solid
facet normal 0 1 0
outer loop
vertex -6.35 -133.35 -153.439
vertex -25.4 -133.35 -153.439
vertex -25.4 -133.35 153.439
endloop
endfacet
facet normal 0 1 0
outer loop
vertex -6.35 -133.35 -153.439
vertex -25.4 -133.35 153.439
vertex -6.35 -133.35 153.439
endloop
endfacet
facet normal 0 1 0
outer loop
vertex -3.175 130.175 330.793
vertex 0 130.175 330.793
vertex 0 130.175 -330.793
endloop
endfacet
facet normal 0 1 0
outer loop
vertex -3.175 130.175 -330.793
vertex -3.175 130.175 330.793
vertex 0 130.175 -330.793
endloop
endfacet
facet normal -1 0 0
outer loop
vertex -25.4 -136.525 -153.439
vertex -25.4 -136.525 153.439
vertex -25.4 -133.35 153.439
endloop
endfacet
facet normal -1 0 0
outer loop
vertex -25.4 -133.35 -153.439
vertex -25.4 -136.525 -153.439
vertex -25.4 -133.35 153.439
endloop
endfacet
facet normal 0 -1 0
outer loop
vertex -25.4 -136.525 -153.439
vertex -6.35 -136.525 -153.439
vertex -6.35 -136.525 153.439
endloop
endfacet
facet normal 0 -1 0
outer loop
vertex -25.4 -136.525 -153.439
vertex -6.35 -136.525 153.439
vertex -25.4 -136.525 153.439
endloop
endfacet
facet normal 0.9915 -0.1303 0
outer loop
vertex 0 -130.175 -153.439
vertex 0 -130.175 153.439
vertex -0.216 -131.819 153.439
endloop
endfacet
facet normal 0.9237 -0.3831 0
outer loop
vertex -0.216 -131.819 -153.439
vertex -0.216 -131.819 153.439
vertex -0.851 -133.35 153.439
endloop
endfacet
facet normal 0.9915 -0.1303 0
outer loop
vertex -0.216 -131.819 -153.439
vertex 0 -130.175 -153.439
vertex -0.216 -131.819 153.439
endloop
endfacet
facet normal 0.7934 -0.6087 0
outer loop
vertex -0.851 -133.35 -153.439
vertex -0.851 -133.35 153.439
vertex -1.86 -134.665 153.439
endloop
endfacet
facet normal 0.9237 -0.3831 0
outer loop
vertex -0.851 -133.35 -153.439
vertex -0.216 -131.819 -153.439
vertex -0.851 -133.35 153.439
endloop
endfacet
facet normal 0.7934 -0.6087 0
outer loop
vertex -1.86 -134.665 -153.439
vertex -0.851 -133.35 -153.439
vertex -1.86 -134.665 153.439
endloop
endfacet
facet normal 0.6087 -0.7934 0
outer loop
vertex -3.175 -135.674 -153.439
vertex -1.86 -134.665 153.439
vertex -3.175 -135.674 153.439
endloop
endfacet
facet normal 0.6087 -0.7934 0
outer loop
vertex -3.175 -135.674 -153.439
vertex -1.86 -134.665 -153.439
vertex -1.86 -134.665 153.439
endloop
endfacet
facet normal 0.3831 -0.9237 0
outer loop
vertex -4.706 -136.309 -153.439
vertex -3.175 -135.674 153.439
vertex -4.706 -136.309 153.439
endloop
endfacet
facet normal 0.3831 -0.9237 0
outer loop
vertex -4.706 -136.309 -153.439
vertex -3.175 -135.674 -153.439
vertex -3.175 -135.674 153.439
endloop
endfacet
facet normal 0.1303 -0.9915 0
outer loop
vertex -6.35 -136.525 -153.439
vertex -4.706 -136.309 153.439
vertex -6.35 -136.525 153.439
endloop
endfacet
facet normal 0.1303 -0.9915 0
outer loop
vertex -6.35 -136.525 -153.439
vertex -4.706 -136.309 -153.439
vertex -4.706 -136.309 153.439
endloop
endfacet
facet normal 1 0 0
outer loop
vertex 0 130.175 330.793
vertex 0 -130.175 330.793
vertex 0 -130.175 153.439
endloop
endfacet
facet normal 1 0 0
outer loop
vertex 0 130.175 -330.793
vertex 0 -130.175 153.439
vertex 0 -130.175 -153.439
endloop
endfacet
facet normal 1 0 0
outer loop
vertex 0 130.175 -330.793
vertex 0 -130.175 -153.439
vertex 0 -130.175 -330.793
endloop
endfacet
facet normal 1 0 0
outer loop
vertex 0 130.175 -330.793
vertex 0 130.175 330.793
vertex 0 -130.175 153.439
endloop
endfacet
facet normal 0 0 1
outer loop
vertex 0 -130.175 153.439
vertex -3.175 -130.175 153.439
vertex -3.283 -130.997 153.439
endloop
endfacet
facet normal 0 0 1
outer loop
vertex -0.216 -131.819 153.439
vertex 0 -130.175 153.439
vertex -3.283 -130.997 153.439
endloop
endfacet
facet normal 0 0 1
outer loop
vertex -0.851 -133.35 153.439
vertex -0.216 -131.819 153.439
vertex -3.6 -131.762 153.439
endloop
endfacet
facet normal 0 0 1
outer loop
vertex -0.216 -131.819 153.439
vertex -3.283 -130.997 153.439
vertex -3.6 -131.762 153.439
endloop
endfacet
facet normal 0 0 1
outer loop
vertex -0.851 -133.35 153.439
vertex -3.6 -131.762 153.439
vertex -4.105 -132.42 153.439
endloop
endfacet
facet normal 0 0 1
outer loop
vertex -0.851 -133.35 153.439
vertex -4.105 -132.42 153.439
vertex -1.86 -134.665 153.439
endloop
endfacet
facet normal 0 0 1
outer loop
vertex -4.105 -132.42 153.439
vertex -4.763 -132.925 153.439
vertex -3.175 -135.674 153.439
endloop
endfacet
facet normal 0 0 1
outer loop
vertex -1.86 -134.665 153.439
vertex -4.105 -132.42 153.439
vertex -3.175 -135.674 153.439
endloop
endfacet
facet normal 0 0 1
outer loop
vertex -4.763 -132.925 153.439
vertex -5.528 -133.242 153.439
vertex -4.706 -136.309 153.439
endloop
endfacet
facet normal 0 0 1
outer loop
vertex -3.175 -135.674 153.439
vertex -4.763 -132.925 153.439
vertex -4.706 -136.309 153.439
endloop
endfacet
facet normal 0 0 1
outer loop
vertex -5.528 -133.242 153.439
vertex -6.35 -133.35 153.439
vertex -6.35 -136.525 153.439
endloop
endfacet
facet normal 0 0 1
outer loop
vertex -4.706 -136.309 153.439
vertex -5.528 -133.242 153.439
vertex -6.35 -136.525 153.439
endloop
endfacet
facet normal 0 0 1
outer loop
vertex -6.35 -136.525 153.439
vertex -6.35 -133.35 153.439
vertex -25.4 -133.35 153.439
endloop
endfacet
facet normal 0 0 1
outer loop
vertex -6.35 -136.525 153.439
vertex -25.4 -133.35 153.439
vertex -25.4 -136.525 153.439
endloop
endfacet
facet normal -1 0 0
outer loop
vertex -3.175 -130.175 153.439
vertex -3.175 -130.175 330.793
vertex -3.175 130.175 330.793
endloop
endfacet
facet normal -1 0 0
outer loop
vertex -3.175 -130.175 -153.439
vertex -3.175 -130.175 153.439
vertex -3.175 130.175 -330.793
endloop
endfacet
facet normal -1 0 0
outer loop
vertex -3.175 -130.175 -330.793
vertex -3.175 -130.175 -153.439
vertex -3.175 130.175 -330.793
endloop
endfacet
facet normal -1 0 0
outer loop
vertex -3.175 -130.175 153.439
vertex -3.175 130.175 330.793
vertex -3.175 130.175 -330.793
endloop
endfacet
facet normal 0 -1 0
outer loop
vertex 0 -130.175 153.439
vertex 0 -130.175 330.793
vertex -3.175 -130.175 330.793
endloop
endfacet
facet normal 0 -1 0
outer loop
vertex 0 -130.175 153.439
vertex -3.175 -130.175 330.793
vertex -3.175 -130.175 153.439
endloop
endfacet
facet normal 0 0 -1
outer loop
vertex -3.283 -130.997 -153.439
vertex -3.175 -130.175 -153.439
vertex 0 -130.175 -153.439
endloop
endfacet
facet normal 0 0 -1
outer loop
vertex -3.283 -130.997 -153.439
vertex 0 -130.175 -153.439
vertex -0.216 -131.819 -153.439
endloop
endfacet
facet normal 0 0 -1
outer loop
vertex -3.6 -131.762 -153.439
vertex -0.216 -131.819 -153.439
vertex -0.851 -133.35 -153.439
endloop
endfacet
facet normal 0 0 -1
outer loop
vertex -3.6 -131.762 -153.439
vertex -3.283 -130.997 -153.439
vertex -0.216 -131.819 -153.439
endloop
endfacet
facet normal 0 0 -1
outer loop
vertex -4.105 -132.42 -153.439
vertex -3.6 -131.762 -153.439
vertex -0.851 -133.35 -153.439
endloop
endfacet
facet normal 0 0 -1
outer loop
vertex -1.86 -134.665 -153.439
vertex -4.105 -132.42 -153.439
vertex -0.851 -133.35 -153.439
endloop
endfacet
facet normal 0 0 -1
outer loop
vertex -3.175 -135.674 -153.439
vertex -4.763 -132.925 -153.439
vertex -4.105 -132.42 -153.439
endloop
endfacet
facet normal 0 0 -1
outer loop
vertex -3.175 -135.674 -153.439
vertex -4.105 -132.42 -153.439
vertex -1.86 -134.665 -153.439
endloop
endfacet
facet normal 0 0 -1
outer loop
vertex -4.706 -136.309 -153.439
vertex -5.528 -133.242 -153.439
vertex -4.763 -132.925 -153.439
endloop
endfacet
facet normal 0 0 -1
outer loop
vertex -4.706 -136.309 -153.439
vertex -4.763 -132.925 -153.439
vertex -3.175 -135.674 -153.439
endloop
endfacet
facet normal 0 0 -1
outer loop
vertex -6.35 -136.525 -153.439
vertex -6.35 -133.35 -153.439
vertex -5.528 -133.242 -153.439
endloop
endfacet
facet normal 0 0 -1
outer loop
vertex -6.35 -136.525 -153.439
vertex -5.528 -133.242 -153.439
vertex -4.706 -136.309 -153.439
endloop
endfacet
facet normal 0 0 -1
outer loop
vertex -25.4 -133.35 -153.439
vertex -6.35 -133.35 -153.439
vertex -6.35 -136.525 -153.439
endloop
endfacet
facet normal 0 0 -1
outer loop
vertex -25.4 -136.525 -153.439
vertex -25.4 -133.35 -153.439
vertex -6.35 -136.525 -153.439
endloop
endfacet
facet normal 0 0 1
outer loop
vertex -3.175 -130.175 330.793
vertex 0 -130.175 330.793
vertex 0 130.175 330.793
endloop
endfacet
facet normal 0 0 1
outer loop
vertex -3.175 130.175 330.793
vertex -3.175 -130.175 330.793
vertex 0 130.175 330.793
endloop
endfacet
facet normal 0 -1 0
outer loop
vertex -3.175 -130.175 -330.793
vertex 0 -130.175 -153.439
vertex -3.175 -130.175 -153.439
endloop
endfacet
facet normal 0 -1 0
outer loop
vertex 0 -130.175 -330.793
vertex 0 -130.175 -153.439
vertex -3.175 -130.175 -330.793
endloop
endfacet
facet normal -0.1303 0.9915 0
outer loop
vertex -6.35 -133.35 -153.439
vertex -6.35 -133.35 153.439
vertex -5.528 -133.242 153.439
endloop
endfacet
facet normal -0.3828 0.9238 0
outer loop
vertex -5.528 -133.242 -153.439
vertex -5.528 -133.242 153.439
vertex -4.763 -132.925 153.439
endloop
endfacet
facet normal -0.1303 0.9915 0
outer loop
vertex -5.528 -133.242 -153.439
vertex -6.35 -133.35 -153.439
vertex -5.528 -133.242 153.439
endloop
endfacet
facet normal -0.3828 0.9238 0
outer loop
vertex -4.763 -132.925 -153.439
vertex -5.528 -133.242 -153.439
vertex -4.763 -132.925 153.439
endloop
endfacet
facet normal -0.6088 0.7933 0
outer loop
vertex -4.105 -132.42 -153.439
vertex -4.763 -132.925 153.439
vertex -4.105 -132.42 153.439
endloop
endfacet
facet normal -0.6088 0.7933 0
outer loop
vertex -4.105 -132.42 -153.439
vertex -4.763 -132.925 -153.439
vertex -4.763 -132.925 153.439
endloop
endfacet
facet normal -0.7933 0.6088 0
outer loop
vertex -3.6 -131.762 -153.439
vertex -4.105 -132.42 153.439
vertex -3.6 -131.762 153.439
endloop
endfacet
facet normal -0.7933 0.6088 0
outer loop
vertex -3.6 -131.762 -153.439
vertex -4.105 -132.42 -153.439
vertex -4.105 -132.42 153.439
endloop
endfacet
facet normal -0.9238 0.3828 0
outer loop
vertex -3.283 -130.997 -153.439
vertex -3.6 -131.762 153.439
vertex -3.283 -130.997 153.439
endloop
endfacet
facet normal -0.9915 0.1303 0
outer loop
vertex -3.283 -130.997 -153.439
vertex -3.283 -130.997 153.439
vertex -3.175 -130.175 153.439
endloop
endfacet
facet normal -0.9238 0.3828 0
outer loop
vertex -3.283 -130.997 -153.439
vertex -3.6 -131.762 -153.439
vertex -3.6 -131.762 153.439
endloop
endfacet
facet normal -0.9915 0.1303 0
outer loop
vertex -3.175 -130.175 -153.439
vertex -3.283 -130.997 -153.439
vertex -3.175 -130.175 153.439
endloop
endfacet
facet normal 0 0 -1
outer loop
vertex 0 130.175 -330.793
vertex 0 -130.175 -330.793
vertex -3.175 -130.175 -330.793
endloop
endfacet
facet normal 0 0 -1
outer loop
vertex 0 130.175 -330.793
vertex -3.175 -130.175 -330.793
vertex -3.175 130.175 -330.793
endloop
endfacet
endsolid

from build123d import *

# Parameters (mm, degrees)
SKETCH1_W          = 661.58618
SKETCH1_H          = 260.35
BASE_FLANGE1_DEPTH = 3.175
EDGE_FLANGE1_DEPTH = 306.87772


# Sheet-metal steps are written as plain solids
with BuildPart() as part:
    # Sketch1 → Base-Flange1 (new body)
    with BuildSketch(Plane(origin=(0, 0, 0), x_dir=(0, 0, -1), z_dir=(1, 0, 0))):
        Rectangle(SKETCH1_W, SKETCH1_H)
    extrude(amount=-BASE_FLANGE1_DEPTH)

    # Edge-Flange1 section (across the edge) → Edge-Flange1 (add)
    with BuildSketch(Plane(origin=(-3.175, -133.35, -153.43886), x_dir=(0, 1, 0), z_dir=(0, 0, 1))):
        with BuildLine():
            Line((-3.175, 3.175), (-3.175, 22.225))
            Line((-3.175, 22.225), (0, 22.225))
            Line((0, 22.225), (0, 3.175))
            ThreePointArc((0, 3.175), (0.92993597, 0.92993597), (3.175, 0))
            Line((3.175, 0), (3.175, -3.175))
            ThreePointArc((3.175, -3.175), (-1.315128061, -1.315128061), (-3.175, 3.175))
        make_face()
    extrude(amount=EDGE_FLANGE1_DEPTH)


solid = part.part
